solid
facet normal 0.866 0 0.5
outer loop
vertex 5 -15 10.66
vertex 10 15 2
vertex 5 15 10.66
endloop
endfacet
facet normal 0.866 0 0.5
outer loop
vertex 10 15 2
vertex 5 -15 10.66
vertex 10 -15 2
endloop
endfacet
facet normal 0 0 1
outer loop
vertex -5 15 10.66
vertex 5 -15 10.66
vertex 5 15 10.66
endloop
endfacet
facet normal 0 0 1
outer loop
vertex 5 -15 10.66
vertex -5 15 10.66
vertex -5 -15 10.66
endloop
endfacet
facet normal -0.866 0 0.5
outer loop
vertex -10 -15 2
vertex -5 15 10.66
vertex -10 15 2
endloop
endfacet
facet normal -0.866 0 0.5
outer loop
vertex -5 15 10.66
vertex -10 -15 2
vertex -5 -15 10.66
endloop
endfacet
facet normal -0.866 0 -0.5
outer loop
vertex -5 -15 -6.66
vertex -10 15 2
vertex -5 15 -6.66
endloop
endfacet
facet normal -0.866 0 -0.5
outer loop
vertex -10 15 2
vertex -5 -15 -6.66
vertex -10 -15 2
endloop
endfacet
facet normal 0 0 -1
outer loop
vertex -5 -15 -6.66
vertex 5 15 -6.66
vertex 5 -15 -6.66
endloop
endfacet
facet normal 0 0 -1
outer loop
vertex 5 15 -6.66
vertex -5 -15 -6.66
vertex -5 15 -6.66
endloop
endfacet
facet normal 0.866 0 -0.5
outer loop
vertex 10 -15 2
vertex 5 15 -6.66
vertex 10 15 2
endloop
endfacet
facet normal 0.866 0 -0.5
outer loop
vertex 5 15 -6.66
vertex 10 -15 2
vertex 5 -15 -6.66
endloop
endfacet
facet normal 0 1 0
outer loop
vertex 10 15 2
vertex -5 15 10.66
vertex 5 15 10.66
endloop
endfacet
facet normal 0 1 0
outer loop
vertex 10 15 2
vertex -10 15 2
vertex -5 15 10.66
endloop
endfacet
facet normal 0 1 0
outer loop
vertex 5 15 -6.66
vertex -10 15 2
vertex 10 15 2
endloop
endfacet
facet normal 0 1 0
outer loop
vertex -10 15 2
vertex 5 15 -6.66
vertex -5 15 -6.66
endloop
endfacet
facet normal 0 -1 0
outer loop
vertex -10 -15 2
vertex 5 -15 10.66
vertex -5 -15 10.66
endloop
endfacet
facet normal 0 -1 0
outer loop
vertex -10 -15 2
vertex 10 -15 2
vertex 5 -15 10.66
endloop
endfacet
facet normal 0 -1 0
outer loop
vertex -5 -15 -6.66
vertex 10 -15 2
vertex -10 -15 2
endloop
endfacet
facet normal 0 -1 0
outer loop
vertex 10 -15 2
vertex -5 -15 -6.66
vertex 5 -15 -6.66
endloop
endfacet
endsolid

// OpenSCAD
translate([0,0,2]) {
    rotate([90,0,0]) {
        cylinder(h = 30, d = 20, $fn = 6, center=true);
    }
}
